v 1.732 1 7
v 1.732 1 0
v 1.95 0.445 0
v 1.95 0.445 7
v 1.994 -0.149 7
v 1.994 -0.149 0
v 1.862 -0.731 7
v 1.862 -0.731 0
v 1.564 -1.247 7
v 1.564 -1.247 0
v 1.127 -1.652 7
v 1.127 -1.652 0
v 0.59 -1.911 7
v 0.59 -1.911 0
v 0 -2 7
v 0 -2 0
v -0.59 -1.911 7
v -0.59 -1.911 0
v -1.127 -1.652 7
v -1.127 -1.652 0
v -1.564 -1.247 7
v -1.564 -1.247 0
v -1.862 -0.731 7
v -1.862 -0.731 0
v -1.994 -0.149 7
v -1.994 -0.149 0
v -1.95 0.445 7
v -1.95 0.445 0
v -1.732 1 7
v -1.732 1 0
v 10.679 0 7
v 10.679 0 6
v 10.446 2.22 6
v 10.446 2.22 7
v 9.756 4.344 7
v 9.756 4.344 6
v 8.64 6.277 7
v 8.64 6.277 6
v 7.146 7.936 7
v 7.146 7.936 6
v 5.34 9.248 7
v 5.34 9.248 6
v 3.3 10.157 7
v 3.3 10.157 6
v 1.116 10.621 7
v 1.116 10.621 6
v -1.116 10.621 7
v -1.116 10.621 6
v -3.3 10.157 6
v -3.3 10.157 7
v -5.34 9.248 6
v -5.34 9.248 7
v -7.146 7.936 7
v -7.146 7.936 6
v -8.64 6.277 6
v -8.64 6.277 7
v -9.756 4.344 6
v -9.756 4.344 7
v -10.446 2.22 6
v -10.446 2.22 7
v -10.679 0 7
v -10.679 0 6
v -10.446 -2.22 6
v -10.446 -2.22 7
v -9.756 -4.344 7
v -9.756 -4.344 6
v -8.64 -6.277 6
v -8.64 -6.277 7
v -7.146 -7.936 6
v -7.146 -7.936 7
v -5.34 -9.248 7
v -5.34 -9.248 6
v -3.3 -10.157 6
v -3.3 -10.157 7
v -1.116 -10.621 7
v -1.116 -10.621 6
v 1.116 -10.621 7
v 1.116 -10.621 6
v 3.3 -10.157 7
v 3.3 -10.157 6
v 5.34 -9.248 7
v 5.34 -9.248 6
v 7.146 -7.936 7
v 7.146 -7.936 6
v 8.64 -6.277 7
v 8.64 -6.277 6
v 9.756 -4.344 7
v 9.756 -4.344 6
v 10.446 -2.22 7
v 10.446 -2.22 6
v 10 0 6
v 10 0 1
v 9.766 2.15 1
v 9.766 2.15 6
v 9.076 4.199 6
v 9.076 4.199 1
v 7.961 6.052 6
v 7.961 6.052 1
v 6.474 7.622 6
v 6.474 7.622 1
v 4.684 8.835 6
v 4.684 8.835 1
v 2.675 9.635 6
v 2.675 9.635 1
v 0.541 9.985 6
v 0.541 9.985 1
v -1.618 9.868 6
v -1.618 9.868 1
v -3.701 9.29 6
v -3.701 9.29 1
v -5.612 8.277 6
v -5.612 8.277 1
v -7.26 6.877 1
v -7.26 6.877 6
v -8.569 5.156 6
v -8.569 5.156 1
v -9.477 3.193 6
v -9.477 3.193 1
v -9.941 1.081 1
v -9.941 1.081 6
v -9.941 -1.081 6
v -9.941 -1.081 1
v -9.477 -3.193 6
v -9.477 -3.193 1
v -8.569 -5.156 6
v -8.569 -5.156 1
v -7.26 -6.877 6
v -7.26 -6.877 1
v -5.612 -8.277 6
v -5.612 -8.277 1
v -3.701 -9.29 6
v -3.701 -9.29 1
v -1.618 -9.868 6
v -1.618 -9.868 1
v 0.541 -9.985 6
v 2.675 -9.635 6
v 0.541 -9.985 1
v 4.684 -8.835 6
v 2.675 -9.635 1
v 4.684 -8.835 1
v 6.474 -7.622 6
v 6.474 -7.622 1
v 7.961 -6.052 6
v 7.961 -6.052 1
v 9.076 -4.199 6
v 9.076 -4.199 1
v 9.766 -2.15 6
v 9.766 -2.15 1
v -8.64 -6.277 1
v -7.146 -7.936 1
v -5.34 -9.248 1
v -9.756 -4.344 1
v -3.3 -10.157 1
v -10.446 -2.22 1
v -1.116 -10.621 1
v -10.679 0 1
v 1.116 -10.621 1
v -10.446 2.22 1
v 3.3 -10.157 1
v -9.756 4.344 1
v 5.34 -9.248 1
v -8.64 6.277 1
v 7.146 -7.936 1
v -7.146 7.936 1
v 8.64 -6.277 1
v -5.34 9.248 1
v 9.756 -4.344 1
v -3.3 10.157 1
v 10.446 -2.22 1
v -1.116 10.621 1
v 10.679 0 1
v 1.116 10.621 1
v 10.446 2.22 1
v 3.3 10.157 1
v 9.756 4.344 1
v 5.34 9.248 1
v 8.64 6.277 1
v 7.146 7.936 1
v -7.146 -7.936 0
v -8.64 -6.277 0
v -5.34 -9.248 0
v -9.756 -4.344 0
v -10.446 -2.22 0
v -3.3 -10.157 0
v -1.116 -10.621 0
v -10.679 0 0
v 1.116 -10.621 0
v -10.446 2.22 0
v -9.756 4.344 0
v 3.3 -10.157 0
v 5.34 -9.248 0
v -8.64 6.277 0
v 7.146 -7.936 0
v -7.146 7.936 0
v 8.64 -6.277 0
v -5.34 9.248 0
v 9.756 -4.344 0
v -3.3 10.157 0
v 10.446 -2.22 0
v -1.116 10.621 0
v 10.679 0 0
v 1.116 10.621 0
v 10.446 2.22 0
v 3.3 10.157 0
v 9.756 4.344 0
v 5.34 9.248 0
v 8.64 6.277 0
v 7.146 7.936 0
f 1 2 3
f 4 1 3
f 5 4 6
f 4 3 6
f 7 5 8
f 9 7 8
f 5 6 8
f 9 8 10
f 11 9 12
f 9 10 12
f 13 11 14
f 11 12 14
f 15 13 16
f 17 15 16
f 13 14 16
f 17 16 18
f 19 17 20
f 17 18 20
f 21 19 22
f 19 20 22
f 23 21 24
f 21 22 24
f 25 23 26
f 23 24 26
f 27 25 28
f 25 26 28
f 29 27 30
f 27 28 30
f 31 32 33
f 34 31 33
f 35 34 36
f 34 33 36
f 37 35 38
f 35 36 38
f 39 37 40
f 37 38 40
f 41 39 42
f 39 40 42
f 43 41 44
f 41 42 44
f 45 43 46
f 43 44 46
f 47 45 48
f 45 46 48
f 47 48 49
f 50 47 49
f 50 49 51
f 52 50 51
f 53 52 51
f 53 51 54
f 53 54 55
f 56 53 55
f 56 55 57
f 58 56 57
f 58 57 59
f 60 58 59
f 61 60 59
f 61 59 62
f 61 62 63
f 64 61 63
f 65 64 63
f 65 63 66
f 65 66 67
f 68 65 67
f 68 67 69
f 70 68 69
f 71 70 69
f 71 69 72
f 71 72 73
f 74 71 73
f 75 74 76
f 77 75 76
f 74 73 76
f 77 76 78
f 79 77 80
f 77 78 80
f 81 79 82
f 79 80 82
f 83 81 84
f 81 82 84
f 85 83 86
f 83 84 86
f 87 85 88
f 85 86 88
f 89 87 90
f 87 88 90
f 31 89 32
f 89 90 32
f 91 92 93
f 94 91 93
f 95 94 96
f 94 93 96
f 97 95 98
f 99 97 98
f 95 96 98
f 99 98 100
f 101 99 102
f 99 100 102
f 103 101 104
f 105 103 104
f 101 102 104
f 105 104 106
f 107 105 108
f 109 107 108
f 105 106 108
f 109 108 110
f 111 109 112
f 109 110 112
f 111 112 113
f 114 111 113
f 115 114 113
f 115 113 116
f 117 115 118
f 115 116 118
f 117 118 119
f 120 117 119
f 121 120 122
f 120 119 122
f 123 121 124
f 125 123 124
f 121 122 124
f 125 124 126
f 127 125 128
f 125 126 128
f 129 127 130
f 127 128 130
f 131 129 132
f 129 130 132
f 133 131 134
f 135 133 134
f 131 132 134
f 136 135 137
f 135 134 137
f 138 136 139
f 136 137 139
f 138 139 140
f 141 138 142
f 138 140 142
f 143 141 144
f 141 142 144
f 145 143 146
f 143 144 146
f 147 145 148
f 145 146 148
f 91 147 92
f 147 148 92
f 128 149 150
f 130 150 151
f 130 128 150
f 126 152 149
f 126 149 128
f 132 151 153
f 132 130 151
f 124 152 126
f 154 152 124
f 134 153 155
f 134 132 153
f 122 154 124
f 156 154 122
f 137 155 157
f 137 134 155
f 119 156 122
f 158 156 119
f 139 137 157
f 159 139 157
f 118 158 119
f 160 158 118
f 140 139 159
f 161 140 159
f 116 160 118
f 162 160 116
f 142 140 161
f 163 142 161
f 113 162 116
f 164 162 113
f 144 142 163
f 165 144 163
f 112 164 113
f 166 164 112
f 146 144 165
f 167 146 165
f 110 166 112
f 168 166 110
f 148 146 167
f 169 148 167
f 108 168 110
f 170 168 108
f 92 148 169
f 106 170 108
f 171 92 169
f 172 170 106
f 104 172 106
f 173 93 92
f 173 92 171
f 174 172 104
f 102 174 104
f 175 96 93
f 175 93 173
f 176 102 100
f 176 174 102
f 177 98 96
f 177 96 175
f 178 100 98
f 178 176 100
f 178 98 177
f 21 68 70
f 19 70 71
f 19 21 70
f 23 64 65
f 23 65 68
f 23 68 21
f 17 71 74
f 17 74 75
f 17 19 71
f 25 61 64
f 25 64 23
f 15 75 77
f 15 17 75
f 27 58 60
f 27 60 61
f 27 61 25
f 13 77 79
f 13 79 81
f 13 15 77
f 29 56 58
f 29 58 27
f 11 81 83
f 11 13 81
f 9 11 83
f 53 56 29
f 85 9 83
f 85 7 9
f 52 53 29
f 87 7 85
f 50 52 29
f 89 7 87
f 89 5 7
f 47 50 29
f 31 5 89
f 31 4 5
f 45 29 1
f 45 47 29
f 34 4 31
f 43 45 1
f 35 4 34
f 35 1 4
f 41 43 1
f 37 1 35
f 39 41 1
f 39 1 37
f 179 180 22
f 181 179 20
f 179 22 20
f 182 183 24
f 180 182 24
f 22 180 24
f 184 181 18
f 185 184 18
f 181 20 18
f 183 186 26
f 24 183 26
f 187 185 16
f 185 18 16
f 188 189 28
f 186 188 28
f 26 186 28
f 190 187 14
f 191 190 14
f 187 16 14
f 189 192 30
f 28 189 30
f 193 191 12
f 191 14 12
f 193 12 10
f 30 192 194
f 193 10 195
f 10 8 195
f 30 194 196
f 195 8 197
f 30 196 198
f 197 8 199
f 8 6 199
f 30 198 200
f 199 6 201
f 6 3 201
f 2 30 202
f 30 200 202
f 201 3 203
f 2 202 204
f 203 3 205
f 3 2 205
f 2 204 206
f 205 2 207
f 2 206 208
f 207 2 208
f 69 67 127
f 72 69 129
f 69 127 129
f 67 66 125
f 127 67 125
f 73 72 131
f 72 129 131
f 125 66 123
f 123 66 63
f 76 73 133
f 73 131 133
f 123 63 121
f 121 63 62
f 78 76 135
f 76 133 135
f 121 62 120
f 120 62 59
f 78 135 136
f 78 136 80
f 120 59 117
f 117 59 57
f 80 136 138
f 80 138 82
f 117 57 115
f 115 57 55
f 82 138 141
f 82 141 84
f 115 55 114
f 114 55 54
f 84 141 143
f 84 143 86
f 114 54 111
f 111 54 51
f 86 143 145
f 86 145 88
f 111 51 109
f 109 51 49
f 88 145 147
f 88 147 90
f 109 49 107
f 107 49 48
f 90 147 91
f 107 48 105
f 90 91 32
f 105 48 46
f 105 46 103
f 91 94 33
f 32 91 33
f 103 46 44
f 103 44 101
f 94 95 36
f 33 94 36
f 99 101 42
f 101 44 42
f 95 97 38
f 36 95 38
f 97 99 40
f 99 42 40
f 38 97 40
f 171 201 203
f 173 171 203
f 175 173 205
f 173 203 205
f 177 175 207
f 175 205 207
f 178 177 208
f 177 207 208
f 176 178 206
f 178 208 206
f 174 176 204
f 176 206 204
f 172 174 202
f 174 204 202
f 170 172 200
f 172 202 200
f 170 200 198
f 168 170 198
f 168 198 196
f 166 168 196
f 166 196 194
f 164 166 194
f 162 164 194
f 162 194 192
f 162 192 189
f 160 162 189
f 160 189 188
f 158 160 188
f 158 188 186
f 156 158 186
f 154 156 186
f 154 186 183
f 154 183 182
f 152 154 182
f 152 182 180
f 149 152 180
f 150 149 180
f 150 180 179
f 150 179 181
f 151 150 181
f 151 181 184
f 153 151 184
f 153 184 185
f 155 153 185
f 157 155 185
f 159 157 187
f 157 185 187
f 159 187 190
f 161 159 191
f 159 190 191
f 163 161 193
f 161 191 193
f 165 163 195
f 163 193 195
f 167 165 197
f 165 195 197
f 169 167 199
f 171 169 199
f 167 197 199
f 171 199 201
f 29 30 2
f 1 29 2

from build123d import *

# Parameters (mm, degrees)
SKETCH1_R           = 10.679205769
BOSS_EXTRUDE1_DEPTH = 7
CUT_EXTRUDE1_START  = -5
SKETCH2_R           = 10.679205769
SKETCH2_R_2         = 10
CUT_EXTRUDE1_DEPTH  = 5


with BuildPart() as part:
    # Sketch1 → Boss-Extrude1 (new body)
    with BuildSketch(Plane.XY):
        Circle(SKETCH1_R)
        with BuildLine():
            Line((-1.732050808, 1), (1.732050808, 1))
            ThreePointArc((1.732050808, 1), (0, -2), (-1.732050808, 1))
        make_face(mode=Mode.SUBTRACT)
    extrude(amount=BOSS_EXTRUDE1_DEPTH)

    # Sketch2 → Cut-Extrude1 (cut)
    with BuildSketch(Plane.XY.offset(6).offset(CUT_EXTRUDE1_START)):
        Circle(SKETCH2_R)
        Circle(SKETCH2_R_2, mode=Mode.SUBTRACT)
    extrude(amount=CUT_EXTRUDE1_DEPTH, mode=Mode.SUBTRACT)


solid = part.part
